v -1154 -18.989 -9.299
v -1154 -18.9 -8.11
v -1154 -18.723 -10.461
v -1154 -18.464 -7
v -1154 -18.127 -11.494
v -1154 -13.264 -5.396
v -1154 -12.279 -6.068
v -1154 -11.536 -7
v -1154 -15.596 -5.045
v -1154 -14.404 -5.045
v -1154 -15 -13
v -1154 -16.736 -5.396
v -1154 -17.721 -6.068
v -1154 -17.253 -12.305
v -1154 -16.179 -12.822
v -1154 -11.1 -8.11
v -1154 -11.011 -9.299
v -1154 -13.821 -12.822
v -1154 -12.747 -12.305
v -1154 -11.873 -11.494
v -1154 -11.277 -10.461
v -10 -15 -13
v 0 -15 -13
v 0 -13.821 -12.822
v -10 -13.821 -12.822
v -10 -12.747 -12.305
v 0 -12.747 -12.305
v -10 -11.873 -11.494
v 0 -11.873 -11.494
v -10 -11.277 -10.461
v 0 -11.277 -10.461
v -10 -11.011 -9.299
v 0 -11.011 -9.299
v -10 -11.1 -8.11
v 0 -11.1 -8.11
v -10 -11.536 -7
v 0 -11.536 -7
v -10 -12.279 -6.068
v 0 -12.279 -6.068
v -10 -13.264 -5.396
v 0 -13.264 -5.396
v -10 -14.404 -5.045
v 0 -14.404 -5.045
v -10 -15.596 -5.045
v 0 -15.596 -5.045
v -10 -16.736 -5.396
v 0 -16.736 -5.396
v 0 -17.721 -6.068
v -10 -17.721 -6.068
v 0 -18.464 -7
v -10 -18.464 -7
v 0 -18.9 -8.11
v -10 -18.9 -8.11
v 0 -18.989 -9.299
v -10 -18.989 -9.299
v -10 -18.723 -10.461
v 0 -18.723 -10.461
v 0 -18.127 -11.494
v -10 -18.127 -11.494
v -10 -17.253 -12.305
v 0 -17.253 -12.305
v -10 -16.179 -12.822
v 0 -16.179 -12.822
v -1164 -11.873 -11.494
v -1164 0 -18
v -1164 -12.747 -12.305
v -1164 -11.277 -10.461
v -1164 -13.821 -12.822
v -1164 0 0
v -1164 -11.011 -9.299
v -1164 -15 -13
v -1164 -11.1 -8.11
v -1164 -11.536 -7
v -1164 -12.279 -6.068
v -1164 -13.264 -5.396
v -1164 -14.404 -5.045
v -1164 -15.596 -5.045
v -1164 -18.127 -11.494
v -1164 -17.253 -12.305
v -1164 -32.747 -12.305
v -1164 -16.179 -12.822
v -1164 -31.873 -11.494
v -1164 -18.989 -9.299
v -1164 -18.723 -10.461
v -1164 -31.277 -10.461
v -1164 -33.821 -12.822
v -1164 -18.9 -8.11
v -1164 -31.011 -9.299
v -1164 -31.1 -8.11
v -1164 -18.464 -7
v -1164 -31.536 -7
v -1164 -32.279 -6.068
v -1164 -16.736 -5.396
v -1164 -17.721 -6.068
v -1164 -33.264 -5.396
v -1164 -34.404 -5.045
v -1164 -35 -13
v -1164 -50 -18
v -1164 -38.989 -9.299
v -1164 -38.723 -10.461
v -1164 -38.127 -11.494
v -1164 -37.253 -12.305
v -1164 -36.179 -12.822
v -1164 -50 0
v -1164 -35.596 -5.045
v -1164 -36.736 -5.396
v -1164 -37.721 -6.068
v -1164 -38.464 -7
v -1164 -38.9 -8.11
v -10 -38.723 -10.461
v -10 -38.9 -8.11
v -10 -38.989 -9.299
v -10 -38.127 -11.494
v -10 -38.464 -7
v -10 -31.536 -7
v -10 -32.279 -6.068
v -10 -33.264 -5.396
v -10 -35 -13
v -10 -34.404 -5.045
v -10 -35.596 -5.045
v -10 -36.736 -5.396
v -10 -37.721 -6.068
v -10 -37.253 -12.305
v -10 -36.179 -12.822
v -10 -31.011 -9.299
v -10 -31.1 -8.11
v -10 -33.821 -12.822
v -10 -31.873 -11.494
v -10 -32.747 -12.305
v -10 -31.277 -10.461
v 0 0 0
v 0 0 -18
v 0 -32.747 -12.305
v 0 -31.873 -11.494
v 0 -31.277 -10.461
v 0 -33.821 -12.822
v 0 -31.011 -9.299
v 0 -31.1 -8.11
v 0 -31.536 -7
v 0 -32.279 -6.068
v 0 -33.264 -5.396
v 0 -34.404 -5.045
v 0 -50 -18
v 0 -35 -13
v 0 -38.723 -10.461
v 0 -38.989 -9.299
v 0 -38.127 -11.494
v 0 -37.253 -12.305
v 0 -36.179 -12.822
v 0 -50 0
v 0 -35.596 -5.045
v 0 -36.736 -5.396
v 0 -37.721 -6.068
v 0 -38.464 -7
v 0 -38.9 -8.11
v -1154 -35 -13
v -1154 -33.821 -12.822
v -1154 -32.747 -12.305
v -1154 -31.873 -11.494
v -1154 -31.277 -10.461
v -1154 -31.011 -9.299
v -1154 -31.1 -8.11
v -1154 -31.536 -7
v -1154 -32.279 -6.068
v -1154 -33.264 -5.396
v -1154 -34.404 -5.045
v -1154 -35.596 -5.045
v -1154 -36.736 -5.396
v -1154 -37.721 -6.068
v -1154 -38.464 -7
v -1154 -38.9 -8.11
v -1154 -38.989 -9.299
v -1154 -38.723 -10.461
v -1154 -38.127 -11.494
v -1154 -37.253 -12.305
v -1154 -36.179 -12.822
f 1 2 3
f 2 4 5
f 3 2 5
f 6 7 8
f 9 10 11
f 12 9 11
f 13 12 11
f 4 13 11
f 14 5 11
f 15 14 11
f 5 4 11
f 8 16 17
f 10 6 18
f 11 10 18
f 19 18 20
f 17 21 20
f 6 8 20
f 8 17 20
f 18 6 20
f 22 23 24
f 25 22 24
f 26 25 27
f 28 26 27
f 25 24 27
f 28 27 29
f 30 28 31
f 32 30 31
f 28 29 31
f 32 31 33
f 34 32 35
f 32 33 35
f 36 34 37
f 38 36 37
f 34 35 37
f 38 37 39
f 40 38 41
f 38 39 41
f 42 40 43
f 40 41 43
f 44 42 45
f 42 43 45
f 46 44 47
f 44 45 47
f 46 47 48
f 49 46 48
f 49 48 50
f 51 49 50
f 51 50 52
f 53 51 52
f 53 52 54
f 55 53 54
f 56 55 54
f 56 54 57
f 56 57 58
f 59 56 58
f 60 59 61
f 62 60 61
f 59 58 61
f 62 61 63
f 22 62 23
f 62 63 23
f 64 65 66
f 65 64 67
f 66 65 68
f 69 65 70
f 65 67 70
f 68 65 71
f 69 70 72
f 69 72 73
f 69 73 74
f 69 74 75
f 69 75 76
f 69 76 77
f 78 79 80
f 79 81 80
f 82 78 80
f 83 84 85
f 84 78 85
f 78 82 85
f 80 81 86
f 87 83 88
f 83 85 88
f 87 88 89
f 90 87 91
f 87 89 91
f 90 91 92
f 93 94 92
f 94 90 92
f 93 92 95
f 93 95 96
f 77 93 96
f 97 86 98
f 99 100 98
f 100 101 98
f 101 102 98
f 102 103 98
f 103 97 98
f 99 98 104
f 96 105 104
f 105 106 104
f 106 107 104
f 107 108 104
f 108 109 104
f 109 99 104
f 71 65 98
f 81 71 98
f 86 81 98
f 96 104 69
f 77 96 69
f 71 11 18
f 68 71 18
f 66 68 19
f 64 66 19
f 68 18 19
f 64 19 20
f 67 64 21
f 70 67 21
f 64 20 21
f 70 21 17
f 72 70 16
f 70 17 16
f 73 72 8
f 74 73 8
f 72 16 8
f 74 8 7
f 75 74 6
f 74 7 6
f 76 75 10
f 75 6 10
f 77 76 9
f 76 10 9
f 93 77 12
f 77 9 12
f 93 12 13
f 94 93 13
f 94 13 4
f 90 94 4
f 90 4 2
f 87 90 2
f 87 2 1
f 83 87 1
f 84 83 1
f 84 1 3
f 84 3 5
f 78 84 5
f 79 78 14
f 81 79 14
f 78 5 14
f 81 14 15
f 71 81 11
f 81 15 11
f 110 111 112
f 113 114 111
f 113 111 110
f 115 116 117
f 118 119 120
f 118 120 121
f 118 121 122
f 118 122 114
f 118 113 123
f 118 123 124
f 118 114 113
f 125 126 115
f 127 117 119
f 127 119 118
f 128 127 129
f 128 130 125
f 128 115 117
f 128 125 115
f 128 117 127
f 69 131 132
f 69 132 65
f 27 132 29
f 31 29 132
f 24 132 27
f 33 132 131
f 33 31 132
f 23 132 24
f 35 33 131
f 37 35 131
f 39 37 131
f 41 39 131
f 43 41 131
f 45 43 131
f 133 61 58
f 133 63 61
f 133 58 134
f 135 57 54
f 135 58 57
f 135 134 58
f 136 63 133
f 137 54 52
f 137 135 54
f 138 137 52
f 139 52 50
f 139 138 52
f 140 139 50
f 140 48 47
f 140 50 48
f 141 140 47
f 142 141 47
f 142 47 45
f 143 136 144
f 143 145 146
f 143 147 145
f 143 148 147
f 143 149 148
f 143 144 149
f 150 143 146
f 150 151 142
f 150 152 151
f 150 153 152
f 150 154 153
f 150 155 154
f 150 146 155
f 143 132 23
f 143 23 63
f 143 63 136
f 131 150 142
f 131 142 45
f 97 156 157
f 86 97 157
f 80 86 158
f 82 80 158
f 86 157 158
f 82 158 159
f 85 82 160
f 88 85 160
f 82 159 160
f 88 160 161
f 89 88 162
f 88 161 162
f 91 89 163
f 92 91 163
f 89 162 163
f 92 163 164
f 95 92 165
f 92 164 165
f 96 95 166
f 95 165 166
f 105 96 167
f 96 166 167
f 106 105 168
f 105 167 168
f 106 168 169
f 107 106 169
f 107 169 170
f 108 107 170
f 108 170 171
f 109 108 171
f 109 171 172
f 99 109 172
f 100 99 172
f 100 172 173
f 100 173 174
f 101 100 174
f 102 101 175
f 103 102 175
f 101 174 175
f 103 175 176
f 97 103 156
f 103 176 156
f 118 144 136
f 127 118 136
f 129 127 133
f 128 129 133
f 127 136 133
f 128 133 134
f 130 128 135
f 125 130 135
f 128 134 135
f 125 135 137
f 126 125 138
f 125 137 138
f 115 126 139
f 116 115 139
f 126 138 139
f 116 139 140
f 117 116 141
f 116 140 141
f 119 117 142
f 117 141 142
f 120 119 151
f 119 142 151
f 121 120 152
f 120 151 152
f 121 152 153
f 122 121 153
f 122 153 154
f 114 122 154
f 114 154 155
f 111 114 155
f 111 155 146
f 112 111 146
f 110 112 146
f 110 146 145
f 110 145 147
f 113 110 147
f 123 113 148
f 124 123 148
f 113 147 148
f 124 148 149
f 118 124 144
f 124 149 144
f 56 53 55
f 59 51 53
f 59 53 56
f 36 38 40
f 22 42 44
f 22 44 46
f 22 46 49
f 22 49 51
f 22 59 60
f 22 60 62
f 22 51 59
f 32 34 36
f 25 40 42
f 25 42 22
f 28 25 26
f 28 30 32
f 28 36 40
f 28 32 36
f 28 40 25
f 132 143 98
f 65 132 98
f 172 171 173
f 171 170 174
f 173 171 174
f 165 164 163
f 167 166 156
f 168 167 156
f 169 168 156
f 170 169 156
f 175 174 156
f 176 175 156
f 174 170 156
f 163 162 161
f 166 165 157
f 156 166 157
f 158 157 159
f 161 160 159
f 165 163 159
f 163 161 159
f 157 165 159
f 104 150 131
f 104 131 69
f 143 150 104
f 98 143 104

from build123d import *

# Parameters (mm, degrees)
SKETCH1_W      = 1164
SKETCH1_H      = 18
PLINTH_DEPTH   = 50
SKETCH2_R      = 4
EXTRUDE1_DEPTH = 10
EXTRUDE2_START = 10
SKETCH3_R      = 4
EXTRUDE2_DEPTH = 10


with BuildPart() as part:
    # Sketch1 → Plinth (new body)
    with BuildSketch(Plane(origin=(0, -50, 0), x_dir=(-1, 0, 0), z_dir=(0, 1, 0))):
        with Locations((582, -9)):
            Rectangle(SKETCH1_W, SKETCH1_H)
    extrude(amount=PLINTH_DEPTH)

    # Sketch2 → Extrude1 (cut)
    with BuildSketch(Plane(origin=(0, 0, 0), x_dir=(0, 0, -1), z_dir=(1, 0, 0))):
        with Locations((9, -15)):
            Circle(SKETCH2_R)
        with Locations((9, -35)):
            Circle(SKETCH2_R)
    extrude(amount=-EXTRUDE1_DEPTH, mode=Mode.SUBTRACT)

    # Sketch3 → Extrude2 (cut)
    with BuildSketch(Plane(origin=(-1164, 0, 0), x_dir=(0, 0, -1), z_dir=(1, 0, 0)).offset(EXTRUDE2_START)):
        with Locations((9, -35)):
            Circle(SKETCH3_R)
        with Locations((9, -15)):
            Circle(SKETCH3_R)
    extrude(amount=-EXTRUDE2_DEPTH, mode=Mode.SUBTRACT)


solid = part.part
